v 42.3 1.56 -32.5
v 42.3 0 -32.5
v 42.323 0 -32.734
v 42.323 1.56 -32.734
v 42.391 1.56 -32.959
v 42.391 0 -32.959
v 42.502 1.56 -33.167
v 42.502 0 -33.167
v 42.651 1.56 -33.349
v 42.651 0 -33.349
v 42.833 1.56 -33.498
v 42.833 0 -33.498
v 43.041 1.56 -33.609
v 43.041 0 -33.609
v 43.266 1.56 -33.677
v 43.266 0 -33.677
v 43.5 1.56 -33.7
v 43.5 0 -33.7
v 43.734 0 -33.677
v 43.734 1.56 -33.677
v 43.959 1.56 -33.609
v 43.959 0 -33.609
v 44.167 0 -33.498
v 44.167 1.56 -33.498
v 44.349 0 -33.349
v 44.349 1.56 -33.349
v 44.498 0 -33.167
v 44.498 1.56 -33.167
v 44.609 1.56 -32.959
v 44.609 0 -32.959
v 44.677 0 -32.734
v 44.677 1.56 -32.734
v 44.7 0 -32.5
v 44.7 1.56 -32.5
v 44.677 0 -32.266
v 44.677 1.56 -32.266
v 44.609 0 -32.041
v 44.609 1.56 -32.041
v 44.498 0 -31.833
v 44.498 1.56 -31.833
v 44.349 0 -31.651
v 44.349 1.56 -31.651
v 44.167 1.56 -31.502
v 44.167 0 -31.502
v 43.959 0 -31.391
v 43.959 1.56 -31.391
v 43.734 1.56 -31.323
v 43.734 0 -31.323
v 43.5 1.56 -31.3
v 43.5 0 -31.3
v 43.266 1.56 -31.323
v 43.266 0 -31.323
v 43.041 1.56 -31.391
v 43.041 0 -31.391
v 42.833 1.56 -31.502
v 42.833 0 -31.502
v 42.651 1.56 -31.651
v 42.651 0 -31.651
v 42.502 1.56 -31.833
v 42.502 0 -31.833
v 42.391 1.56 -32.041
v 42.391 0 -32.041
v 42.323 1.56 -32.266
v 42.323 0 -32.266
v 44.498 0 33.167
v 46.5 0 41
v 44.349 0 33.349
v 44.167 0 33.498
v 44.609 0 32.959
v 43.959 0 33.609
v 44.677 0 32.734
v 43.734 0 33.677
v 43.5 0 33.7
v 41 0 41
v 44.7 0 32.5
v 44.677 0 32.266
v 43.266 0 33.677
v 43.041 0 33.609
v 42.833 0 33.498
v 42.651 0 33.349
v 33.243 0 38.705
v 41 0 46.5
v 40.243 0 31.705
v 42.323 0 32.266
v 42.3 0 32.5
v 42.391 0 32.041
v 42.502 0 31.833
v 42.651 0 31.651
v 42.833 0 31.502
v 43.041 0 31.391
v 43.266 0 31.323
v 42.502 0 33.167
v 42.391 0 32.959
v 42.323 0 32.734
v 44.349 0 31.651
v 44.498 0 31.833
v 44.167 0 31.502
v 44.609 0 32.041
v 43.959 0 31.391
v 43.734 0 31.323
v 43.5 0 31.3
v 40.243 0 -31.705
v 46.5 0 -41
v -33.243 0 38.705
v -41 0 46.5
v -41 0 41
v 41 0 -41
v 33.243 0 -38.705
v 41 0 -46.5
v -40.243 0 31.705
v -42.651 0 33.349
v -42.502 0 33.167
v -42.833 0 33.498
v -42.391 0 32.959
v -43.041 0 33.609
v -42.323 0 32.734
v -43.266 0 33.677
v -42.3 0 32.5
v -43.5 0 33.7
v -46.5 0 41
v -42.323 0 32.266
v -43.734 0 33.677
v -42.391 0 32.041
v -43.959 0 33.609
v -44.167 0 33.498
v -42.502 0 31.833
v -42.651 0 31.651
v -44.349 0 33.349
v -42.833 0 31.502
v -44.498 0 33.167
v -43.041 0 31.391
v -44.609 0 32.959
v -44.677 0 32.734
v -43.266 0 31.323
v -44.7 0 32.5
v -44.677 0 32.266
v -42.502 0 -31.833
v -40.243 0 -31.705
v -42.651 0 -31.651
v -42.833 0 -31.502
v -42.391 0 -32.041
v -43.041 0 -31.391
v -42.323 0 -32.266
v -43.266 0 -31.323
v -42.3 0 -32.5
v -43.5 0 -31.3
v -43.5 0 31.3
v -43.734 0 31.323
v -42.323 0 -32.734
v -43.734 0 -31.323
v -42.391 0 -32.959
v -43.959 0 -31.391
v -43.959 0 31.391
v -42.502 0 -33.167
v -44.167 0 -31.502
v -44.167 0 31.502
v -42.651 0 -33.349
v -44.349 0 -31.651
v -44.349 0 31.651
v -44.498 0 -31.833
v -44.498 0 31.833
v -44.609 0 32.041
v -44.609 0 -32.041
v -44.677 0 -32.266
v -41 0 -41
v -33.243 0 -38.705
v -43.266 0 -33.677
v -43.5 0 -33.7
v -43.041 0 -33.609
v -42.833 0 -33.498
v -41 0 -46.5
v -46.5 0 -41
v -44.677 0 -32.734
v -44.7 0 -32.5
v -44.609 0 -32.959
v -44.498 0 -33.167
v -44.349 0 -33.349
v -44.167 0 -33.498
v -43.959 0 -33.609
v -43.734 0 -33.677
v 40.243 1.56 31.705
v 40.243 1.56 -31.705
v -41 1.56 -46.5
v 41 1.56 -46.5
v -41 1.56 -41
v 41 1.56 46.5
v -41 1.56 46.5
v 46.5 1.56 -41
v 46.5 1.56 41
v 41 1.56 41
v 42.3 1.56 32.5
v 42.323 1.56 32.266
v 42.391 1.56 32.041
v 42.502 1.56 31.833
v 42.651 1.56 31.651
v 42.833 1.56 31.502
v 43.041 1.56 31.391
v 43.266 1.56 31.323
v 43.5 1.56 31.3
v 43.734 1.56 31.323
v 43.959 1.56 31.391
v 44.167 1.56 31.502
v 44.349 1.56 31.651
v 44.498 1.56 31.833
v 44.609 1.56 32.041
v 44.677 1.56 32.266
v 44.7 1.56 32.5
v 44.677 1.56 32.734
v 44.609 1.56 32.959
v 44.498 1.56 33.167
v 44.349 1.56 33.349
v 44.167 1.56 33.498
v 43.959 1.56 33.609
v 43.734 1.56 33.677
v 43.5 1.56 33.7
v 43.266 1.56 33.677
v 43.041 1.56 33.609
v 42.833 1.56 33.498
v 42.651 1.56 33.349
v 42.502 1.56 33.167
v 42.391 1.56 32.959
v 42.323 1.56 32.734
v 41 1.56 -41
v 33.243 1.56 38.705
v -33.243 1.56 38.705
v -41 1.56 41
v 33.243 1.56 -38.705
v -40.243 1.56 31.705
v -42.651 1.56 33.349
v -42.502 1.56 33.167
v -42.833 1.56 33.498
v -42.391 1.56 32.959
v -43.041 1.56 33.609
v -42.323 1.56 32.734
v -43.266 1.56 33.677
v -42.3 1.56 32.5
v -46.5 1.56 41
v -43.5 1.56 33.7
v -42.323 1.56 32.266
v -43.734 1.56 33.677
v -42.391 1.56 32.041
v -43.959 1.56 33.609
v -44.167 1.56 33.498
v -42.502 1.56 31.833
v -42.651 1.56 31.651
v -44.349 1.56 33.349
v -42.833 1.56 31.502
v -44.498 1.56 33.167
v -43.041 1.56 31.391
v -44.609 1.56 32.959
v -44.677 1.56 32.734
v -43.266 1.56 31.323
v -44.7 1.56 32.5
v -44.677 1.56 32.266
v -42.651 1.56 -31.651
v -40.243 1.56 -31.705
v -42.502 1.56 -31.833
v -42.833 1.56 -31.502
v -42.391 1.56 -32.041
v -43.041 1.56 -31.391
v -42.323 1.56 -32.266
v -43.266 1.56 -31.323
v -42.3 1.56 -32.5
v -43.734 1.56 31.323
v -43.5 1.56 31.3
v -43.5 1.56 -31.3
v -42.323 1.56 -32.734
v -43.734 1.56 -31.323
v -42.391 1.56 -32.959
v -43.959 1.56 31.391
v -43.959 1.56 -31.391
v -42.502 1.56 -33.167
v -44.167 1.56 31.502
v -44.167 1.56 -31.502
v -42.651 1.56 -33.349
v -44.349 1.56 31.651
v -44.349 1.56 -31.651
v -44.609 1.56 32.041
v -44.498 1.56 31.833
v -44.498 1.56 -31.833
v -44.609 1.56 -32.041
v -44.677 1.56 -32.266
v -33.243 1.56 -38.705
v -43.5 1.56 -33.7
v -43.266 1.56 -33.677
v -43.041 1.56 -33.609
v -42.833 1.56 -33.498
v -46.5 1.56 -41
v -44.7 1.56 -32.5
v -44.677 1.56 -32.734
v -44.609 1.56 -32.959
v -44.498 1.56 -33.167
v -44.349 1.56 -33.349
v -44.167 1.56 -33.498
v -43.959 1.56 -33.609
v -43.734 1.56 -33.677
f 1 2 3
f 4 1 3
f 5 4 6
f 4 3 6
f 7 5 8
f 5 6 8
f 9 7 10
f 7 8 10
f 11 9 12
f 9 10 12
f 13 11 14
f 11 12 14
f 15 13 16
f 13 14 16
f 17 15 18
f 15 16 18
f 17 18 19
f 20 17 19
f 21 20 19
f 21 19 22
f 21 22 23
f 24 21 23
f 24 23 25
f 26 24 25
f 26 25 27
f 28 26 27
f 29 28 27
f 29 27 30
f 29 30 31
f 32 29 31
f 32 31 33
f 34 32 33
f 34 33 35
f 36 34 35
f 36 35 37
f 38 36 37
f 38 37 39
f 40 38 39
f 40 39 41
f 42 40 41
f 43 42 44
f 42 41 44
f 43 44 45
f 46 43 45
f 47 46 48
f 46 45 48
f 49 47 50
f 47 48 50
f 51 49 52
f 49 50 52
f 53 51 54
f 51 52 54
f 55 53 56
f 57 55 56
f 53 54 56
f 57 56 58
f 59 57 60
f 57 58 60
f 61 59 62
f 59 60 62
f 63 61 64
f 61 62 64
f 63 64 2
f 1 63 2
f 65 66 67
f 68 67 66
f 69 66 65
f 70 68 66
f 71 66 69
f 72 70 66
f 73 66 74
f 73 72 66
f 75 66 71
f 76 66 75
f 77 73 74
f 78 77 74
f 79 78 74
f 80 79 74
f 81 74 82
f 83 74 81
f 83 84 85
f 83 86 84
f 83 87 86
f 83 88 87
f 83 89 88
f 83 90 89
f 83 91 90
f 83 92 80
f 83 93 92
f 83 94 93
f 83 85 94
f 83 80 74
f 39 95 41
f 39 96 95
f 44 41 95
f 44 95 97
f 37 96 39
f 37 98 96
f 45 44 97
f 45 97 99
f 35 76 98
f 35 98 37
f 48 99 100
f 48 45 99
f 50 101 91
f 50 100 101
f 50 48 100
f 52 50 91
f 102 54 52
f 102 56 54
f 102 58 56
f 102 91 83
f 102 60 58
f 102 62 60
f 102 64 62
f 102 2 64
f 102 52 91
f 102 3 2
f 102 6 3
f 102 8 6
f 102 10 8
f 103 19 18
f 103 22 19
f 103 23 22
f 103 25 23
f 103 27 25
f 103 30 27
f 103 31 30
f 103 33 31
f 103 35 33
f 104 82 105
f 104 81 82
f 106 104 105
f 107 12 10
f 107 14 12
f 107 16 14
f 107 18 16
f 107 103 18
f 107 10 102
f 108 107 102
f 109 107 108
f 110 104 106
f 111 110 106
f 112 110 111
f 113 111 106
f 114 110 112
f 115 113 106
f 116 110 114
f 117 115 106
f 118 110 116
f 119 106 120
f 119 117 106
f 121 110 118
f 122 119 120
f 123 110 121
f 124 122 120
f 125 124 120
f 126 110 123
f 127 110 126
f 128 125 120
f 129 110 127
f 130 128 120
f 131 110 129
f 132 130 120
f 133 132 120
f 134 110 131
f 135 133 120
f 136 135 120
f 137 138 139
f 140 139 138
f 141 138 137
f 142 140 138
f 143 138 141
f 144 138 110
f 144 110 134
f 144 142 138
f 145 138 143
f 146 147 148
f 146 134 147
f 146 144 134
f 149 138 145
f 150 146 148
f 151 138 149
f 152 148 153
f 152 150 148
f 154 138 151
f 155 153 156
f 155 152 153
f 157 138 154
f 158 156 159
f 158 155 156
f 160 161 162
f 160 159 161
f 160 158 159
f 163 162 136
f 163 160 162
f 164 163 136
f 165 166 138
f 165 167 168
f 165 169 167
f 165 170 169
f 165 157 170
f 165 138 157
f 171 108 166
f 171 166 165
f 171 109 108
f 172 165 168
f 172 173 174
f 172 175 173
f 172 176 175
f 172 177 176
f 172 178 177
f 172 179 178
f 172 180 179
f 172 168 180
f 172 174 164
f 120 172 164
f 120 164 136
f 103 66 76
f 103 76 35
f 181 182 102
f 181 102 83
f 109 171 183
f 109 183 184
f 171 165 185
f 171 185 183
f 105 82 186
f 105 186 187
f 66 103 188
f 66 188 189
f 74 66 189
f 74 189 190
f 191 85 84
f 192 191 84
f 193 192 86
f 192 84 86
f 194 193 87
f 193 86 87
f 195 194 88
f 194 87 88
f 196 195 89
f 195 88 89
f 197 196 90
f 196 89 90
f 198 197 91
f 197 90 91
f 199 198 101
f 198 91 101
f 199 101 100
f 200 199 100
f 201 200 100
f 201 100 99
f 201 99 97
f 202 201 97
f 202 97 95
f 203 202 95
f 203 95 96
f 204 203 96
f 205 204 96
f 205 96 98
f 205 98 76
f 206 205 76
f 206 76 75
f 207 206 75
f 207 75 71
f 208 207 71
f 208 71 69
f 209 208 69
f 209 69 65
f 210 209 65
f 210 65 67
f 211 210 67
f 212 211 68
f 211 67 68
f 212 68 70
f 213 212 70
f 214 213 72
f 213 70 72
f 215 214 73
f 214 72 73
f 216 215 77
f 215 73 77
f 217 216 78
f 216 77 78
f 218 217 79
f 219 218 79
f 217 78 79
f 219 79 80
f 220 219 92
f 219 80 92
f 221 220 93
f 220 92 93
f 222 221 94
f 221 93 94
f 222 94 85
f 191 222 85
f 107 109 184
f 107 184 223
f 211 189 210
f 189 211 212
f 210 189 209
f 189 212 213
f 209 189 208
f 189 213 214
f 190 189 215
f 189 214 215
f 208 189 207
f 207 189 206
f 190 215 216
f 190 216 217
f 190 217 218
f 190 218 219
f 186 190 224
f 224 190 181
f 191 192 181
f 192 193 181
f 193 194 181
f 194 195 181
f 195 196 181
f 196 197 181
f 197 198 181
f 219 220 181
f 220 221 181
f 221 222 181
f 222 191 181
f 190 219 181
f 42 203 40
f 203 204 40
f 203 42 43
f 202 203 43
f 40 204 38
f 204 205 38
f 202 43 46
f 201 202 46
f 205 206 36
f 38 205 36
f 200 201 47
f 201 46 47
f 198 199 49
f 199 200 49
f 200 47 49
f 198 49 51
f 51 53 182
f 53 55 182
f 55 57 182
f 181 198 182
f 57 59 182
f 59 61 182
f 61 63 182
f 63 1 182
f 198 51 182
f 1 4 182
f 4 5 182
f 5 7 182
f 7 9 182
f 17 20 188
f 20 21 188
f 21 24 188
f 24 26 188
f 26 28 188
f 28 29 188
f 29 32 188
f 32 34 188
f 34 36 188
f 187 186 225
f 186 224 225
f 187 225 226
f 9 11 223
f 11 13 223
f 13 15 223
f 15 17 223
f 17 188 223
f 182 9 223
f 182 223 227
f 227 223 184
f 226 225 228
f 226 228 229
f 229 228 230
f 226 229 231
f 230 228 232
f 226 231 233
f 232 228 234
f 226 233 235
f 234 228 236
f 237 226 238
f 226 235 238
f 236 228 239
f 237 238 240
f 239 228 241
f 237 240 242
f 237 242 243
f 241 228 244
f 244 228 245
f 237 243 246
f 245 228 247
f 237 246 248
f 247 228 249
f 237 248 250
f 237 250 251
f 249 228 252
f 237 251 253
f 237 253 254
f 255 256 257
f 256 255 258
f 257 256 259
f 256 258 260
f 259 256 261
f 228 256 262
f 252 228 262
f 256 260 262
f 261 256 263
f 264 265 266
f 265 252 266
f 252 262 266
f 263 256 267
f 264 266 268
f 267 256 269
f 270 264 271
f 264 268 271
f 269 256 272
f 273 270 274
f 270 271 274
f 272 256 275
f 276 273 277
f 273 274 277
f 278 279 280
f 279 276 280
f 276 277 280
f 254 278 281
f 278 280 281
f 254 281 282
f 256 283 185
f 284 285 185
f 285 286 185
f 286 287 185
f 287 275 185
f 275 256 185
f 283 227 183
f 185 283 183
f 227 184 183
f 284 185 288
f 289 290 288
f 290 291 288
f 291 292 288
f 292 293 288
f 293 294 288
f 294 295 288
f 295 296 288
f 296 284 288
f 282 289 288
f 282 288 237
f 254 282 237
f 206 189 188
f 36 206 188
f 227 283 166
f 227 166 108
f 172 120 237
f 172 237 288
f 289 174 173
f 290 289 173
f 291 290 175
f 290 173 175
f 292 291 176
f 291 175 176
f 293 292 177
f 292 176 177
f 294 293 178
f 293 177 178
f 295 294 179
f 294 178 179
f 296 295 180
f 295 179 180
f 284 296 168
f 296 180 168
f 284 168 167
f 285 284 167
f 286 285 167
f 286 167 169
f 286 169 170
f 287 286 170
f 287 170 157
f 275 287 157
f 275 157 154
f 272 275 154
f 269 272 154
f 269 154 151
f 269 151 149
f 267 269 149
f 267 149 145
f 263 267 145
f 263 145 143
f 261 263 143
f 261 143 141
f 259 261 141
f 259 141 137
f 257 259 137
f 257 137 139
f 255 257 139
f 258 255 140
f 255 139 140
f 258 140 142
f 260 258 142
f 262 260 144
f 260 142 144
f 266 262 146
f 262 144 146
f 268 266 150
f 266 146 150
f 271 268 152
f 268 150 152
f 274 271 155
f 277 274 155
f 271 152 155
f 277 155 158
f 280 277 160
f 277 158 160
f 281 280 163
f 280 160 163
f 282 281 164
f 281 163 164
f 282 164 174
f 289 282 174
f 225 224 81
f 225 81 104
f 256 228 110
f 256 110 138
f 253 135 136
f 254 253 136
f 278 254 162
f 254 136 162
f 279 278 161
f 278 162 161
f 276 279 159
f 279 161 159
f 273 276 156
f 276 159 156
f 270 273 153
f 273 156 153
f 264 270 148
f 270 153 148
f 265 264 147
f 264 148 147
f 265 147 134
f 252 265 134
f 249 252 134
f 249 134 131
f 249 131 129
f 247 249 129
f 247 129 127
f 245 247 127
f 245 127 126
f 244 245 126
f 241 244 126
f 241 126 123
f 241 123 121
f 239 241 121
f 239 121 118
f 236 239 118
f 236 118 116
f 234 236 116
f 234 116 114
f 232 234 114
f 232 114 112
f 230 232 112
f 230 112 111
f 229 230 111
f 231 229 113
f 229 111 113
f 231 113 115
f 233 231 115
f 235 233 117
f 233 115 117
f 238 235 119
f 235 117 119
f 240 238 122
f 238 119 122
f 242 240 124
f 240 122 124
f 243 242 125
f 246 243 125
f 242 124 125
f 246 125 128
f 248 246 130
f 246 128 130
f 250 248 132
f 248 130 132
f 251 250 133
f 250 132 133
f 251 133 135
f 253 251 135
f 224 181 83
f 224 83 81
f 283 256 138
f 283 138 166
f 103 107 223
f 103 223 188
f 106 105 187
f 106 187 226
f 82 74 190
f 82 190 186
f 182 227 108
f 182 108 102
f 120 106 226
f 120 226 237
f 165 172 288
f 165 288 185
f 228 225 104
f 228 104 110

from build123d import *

# Parameters (mm, degrees)
BOSS_EXTRUDE1_DEPTH      = 1.56
CUT_EXTRUDE1_DEPTH       = 1.56
M2_CLEARANCE_HOLE1_D     = 2.4
M2_CLEARANCE_HOLE1_DEPTH = 38.1
M2_CLEARANCE_HOLE1_TIP   = 0.721032743


with BuildPart() as part:
    # Sketch1 → Boss-Extrude1 (new body)
    with BuildSketch(Plane(origin=(0, 0, 0), x_dir=(1, 0, 0), z_dir=(0, 1, 0))):
        Polygon((-41, -41), (-46.5, -41), (-46.5, 41), (-41, 41), (-41, 46.5), (41, 46.5), (41, 41), (46.5, 41), (46.5, -41), (41, -41), (41, -46.5), (-41, -46.5), align=None)
    extrude(amount=BOSS_EXTRUDE1_DEPTH)

    # Sketch2 → Cut-Extrude1 (cut)
    with BuildSketch(Plane(origin=(0, 1.56, 0), x_dir=(1, 0, 0), z_dir=(0, 1, 0))):
        Polygon((-40.243314804, 31.704788024), (-33.243314804, 38.704788024), (33.243314804, 38.704788024), (40.243314804, 31.704788024), (40.243314804, -31.704788024), (33.243314804, -38.704788024), (-33.243314804, -38.704788024), (-40.243314804, -31.704788024), align=None)
    extrude(amount=-CUT_EXTRUDE1_DEPTH, mode=Mode.SUBTRACT)

    # M2 Clearance Hole1
    with Locations(Plane(origin=(0, 1.56, 0), x_dir=(1, 0, 0), z_dir=(0, 1, 0))):
        with Locations((-43.5, -32.5), (-43.5, 32.5), (43.5, 32.5), (43.5, -32.5)):
            Hole(M2_CLEARANCE_HOLE1_D / 2, depth=M2_CLEARANCE_HOLE1_DEPTH)
            with Locations((0, 0, -(M2_CLEARANCE_HOLE1_DEPTH + M2_CLEARANCE_HOLE1_TIP / 2))):  # 118° drill point
                Cone(0, M2_CLEARANCE_HOLE1_D / 2, M2_CLEARANCE_HOLE1_TIP, mode=Mode.SUBTRACT)


solid = part.part
